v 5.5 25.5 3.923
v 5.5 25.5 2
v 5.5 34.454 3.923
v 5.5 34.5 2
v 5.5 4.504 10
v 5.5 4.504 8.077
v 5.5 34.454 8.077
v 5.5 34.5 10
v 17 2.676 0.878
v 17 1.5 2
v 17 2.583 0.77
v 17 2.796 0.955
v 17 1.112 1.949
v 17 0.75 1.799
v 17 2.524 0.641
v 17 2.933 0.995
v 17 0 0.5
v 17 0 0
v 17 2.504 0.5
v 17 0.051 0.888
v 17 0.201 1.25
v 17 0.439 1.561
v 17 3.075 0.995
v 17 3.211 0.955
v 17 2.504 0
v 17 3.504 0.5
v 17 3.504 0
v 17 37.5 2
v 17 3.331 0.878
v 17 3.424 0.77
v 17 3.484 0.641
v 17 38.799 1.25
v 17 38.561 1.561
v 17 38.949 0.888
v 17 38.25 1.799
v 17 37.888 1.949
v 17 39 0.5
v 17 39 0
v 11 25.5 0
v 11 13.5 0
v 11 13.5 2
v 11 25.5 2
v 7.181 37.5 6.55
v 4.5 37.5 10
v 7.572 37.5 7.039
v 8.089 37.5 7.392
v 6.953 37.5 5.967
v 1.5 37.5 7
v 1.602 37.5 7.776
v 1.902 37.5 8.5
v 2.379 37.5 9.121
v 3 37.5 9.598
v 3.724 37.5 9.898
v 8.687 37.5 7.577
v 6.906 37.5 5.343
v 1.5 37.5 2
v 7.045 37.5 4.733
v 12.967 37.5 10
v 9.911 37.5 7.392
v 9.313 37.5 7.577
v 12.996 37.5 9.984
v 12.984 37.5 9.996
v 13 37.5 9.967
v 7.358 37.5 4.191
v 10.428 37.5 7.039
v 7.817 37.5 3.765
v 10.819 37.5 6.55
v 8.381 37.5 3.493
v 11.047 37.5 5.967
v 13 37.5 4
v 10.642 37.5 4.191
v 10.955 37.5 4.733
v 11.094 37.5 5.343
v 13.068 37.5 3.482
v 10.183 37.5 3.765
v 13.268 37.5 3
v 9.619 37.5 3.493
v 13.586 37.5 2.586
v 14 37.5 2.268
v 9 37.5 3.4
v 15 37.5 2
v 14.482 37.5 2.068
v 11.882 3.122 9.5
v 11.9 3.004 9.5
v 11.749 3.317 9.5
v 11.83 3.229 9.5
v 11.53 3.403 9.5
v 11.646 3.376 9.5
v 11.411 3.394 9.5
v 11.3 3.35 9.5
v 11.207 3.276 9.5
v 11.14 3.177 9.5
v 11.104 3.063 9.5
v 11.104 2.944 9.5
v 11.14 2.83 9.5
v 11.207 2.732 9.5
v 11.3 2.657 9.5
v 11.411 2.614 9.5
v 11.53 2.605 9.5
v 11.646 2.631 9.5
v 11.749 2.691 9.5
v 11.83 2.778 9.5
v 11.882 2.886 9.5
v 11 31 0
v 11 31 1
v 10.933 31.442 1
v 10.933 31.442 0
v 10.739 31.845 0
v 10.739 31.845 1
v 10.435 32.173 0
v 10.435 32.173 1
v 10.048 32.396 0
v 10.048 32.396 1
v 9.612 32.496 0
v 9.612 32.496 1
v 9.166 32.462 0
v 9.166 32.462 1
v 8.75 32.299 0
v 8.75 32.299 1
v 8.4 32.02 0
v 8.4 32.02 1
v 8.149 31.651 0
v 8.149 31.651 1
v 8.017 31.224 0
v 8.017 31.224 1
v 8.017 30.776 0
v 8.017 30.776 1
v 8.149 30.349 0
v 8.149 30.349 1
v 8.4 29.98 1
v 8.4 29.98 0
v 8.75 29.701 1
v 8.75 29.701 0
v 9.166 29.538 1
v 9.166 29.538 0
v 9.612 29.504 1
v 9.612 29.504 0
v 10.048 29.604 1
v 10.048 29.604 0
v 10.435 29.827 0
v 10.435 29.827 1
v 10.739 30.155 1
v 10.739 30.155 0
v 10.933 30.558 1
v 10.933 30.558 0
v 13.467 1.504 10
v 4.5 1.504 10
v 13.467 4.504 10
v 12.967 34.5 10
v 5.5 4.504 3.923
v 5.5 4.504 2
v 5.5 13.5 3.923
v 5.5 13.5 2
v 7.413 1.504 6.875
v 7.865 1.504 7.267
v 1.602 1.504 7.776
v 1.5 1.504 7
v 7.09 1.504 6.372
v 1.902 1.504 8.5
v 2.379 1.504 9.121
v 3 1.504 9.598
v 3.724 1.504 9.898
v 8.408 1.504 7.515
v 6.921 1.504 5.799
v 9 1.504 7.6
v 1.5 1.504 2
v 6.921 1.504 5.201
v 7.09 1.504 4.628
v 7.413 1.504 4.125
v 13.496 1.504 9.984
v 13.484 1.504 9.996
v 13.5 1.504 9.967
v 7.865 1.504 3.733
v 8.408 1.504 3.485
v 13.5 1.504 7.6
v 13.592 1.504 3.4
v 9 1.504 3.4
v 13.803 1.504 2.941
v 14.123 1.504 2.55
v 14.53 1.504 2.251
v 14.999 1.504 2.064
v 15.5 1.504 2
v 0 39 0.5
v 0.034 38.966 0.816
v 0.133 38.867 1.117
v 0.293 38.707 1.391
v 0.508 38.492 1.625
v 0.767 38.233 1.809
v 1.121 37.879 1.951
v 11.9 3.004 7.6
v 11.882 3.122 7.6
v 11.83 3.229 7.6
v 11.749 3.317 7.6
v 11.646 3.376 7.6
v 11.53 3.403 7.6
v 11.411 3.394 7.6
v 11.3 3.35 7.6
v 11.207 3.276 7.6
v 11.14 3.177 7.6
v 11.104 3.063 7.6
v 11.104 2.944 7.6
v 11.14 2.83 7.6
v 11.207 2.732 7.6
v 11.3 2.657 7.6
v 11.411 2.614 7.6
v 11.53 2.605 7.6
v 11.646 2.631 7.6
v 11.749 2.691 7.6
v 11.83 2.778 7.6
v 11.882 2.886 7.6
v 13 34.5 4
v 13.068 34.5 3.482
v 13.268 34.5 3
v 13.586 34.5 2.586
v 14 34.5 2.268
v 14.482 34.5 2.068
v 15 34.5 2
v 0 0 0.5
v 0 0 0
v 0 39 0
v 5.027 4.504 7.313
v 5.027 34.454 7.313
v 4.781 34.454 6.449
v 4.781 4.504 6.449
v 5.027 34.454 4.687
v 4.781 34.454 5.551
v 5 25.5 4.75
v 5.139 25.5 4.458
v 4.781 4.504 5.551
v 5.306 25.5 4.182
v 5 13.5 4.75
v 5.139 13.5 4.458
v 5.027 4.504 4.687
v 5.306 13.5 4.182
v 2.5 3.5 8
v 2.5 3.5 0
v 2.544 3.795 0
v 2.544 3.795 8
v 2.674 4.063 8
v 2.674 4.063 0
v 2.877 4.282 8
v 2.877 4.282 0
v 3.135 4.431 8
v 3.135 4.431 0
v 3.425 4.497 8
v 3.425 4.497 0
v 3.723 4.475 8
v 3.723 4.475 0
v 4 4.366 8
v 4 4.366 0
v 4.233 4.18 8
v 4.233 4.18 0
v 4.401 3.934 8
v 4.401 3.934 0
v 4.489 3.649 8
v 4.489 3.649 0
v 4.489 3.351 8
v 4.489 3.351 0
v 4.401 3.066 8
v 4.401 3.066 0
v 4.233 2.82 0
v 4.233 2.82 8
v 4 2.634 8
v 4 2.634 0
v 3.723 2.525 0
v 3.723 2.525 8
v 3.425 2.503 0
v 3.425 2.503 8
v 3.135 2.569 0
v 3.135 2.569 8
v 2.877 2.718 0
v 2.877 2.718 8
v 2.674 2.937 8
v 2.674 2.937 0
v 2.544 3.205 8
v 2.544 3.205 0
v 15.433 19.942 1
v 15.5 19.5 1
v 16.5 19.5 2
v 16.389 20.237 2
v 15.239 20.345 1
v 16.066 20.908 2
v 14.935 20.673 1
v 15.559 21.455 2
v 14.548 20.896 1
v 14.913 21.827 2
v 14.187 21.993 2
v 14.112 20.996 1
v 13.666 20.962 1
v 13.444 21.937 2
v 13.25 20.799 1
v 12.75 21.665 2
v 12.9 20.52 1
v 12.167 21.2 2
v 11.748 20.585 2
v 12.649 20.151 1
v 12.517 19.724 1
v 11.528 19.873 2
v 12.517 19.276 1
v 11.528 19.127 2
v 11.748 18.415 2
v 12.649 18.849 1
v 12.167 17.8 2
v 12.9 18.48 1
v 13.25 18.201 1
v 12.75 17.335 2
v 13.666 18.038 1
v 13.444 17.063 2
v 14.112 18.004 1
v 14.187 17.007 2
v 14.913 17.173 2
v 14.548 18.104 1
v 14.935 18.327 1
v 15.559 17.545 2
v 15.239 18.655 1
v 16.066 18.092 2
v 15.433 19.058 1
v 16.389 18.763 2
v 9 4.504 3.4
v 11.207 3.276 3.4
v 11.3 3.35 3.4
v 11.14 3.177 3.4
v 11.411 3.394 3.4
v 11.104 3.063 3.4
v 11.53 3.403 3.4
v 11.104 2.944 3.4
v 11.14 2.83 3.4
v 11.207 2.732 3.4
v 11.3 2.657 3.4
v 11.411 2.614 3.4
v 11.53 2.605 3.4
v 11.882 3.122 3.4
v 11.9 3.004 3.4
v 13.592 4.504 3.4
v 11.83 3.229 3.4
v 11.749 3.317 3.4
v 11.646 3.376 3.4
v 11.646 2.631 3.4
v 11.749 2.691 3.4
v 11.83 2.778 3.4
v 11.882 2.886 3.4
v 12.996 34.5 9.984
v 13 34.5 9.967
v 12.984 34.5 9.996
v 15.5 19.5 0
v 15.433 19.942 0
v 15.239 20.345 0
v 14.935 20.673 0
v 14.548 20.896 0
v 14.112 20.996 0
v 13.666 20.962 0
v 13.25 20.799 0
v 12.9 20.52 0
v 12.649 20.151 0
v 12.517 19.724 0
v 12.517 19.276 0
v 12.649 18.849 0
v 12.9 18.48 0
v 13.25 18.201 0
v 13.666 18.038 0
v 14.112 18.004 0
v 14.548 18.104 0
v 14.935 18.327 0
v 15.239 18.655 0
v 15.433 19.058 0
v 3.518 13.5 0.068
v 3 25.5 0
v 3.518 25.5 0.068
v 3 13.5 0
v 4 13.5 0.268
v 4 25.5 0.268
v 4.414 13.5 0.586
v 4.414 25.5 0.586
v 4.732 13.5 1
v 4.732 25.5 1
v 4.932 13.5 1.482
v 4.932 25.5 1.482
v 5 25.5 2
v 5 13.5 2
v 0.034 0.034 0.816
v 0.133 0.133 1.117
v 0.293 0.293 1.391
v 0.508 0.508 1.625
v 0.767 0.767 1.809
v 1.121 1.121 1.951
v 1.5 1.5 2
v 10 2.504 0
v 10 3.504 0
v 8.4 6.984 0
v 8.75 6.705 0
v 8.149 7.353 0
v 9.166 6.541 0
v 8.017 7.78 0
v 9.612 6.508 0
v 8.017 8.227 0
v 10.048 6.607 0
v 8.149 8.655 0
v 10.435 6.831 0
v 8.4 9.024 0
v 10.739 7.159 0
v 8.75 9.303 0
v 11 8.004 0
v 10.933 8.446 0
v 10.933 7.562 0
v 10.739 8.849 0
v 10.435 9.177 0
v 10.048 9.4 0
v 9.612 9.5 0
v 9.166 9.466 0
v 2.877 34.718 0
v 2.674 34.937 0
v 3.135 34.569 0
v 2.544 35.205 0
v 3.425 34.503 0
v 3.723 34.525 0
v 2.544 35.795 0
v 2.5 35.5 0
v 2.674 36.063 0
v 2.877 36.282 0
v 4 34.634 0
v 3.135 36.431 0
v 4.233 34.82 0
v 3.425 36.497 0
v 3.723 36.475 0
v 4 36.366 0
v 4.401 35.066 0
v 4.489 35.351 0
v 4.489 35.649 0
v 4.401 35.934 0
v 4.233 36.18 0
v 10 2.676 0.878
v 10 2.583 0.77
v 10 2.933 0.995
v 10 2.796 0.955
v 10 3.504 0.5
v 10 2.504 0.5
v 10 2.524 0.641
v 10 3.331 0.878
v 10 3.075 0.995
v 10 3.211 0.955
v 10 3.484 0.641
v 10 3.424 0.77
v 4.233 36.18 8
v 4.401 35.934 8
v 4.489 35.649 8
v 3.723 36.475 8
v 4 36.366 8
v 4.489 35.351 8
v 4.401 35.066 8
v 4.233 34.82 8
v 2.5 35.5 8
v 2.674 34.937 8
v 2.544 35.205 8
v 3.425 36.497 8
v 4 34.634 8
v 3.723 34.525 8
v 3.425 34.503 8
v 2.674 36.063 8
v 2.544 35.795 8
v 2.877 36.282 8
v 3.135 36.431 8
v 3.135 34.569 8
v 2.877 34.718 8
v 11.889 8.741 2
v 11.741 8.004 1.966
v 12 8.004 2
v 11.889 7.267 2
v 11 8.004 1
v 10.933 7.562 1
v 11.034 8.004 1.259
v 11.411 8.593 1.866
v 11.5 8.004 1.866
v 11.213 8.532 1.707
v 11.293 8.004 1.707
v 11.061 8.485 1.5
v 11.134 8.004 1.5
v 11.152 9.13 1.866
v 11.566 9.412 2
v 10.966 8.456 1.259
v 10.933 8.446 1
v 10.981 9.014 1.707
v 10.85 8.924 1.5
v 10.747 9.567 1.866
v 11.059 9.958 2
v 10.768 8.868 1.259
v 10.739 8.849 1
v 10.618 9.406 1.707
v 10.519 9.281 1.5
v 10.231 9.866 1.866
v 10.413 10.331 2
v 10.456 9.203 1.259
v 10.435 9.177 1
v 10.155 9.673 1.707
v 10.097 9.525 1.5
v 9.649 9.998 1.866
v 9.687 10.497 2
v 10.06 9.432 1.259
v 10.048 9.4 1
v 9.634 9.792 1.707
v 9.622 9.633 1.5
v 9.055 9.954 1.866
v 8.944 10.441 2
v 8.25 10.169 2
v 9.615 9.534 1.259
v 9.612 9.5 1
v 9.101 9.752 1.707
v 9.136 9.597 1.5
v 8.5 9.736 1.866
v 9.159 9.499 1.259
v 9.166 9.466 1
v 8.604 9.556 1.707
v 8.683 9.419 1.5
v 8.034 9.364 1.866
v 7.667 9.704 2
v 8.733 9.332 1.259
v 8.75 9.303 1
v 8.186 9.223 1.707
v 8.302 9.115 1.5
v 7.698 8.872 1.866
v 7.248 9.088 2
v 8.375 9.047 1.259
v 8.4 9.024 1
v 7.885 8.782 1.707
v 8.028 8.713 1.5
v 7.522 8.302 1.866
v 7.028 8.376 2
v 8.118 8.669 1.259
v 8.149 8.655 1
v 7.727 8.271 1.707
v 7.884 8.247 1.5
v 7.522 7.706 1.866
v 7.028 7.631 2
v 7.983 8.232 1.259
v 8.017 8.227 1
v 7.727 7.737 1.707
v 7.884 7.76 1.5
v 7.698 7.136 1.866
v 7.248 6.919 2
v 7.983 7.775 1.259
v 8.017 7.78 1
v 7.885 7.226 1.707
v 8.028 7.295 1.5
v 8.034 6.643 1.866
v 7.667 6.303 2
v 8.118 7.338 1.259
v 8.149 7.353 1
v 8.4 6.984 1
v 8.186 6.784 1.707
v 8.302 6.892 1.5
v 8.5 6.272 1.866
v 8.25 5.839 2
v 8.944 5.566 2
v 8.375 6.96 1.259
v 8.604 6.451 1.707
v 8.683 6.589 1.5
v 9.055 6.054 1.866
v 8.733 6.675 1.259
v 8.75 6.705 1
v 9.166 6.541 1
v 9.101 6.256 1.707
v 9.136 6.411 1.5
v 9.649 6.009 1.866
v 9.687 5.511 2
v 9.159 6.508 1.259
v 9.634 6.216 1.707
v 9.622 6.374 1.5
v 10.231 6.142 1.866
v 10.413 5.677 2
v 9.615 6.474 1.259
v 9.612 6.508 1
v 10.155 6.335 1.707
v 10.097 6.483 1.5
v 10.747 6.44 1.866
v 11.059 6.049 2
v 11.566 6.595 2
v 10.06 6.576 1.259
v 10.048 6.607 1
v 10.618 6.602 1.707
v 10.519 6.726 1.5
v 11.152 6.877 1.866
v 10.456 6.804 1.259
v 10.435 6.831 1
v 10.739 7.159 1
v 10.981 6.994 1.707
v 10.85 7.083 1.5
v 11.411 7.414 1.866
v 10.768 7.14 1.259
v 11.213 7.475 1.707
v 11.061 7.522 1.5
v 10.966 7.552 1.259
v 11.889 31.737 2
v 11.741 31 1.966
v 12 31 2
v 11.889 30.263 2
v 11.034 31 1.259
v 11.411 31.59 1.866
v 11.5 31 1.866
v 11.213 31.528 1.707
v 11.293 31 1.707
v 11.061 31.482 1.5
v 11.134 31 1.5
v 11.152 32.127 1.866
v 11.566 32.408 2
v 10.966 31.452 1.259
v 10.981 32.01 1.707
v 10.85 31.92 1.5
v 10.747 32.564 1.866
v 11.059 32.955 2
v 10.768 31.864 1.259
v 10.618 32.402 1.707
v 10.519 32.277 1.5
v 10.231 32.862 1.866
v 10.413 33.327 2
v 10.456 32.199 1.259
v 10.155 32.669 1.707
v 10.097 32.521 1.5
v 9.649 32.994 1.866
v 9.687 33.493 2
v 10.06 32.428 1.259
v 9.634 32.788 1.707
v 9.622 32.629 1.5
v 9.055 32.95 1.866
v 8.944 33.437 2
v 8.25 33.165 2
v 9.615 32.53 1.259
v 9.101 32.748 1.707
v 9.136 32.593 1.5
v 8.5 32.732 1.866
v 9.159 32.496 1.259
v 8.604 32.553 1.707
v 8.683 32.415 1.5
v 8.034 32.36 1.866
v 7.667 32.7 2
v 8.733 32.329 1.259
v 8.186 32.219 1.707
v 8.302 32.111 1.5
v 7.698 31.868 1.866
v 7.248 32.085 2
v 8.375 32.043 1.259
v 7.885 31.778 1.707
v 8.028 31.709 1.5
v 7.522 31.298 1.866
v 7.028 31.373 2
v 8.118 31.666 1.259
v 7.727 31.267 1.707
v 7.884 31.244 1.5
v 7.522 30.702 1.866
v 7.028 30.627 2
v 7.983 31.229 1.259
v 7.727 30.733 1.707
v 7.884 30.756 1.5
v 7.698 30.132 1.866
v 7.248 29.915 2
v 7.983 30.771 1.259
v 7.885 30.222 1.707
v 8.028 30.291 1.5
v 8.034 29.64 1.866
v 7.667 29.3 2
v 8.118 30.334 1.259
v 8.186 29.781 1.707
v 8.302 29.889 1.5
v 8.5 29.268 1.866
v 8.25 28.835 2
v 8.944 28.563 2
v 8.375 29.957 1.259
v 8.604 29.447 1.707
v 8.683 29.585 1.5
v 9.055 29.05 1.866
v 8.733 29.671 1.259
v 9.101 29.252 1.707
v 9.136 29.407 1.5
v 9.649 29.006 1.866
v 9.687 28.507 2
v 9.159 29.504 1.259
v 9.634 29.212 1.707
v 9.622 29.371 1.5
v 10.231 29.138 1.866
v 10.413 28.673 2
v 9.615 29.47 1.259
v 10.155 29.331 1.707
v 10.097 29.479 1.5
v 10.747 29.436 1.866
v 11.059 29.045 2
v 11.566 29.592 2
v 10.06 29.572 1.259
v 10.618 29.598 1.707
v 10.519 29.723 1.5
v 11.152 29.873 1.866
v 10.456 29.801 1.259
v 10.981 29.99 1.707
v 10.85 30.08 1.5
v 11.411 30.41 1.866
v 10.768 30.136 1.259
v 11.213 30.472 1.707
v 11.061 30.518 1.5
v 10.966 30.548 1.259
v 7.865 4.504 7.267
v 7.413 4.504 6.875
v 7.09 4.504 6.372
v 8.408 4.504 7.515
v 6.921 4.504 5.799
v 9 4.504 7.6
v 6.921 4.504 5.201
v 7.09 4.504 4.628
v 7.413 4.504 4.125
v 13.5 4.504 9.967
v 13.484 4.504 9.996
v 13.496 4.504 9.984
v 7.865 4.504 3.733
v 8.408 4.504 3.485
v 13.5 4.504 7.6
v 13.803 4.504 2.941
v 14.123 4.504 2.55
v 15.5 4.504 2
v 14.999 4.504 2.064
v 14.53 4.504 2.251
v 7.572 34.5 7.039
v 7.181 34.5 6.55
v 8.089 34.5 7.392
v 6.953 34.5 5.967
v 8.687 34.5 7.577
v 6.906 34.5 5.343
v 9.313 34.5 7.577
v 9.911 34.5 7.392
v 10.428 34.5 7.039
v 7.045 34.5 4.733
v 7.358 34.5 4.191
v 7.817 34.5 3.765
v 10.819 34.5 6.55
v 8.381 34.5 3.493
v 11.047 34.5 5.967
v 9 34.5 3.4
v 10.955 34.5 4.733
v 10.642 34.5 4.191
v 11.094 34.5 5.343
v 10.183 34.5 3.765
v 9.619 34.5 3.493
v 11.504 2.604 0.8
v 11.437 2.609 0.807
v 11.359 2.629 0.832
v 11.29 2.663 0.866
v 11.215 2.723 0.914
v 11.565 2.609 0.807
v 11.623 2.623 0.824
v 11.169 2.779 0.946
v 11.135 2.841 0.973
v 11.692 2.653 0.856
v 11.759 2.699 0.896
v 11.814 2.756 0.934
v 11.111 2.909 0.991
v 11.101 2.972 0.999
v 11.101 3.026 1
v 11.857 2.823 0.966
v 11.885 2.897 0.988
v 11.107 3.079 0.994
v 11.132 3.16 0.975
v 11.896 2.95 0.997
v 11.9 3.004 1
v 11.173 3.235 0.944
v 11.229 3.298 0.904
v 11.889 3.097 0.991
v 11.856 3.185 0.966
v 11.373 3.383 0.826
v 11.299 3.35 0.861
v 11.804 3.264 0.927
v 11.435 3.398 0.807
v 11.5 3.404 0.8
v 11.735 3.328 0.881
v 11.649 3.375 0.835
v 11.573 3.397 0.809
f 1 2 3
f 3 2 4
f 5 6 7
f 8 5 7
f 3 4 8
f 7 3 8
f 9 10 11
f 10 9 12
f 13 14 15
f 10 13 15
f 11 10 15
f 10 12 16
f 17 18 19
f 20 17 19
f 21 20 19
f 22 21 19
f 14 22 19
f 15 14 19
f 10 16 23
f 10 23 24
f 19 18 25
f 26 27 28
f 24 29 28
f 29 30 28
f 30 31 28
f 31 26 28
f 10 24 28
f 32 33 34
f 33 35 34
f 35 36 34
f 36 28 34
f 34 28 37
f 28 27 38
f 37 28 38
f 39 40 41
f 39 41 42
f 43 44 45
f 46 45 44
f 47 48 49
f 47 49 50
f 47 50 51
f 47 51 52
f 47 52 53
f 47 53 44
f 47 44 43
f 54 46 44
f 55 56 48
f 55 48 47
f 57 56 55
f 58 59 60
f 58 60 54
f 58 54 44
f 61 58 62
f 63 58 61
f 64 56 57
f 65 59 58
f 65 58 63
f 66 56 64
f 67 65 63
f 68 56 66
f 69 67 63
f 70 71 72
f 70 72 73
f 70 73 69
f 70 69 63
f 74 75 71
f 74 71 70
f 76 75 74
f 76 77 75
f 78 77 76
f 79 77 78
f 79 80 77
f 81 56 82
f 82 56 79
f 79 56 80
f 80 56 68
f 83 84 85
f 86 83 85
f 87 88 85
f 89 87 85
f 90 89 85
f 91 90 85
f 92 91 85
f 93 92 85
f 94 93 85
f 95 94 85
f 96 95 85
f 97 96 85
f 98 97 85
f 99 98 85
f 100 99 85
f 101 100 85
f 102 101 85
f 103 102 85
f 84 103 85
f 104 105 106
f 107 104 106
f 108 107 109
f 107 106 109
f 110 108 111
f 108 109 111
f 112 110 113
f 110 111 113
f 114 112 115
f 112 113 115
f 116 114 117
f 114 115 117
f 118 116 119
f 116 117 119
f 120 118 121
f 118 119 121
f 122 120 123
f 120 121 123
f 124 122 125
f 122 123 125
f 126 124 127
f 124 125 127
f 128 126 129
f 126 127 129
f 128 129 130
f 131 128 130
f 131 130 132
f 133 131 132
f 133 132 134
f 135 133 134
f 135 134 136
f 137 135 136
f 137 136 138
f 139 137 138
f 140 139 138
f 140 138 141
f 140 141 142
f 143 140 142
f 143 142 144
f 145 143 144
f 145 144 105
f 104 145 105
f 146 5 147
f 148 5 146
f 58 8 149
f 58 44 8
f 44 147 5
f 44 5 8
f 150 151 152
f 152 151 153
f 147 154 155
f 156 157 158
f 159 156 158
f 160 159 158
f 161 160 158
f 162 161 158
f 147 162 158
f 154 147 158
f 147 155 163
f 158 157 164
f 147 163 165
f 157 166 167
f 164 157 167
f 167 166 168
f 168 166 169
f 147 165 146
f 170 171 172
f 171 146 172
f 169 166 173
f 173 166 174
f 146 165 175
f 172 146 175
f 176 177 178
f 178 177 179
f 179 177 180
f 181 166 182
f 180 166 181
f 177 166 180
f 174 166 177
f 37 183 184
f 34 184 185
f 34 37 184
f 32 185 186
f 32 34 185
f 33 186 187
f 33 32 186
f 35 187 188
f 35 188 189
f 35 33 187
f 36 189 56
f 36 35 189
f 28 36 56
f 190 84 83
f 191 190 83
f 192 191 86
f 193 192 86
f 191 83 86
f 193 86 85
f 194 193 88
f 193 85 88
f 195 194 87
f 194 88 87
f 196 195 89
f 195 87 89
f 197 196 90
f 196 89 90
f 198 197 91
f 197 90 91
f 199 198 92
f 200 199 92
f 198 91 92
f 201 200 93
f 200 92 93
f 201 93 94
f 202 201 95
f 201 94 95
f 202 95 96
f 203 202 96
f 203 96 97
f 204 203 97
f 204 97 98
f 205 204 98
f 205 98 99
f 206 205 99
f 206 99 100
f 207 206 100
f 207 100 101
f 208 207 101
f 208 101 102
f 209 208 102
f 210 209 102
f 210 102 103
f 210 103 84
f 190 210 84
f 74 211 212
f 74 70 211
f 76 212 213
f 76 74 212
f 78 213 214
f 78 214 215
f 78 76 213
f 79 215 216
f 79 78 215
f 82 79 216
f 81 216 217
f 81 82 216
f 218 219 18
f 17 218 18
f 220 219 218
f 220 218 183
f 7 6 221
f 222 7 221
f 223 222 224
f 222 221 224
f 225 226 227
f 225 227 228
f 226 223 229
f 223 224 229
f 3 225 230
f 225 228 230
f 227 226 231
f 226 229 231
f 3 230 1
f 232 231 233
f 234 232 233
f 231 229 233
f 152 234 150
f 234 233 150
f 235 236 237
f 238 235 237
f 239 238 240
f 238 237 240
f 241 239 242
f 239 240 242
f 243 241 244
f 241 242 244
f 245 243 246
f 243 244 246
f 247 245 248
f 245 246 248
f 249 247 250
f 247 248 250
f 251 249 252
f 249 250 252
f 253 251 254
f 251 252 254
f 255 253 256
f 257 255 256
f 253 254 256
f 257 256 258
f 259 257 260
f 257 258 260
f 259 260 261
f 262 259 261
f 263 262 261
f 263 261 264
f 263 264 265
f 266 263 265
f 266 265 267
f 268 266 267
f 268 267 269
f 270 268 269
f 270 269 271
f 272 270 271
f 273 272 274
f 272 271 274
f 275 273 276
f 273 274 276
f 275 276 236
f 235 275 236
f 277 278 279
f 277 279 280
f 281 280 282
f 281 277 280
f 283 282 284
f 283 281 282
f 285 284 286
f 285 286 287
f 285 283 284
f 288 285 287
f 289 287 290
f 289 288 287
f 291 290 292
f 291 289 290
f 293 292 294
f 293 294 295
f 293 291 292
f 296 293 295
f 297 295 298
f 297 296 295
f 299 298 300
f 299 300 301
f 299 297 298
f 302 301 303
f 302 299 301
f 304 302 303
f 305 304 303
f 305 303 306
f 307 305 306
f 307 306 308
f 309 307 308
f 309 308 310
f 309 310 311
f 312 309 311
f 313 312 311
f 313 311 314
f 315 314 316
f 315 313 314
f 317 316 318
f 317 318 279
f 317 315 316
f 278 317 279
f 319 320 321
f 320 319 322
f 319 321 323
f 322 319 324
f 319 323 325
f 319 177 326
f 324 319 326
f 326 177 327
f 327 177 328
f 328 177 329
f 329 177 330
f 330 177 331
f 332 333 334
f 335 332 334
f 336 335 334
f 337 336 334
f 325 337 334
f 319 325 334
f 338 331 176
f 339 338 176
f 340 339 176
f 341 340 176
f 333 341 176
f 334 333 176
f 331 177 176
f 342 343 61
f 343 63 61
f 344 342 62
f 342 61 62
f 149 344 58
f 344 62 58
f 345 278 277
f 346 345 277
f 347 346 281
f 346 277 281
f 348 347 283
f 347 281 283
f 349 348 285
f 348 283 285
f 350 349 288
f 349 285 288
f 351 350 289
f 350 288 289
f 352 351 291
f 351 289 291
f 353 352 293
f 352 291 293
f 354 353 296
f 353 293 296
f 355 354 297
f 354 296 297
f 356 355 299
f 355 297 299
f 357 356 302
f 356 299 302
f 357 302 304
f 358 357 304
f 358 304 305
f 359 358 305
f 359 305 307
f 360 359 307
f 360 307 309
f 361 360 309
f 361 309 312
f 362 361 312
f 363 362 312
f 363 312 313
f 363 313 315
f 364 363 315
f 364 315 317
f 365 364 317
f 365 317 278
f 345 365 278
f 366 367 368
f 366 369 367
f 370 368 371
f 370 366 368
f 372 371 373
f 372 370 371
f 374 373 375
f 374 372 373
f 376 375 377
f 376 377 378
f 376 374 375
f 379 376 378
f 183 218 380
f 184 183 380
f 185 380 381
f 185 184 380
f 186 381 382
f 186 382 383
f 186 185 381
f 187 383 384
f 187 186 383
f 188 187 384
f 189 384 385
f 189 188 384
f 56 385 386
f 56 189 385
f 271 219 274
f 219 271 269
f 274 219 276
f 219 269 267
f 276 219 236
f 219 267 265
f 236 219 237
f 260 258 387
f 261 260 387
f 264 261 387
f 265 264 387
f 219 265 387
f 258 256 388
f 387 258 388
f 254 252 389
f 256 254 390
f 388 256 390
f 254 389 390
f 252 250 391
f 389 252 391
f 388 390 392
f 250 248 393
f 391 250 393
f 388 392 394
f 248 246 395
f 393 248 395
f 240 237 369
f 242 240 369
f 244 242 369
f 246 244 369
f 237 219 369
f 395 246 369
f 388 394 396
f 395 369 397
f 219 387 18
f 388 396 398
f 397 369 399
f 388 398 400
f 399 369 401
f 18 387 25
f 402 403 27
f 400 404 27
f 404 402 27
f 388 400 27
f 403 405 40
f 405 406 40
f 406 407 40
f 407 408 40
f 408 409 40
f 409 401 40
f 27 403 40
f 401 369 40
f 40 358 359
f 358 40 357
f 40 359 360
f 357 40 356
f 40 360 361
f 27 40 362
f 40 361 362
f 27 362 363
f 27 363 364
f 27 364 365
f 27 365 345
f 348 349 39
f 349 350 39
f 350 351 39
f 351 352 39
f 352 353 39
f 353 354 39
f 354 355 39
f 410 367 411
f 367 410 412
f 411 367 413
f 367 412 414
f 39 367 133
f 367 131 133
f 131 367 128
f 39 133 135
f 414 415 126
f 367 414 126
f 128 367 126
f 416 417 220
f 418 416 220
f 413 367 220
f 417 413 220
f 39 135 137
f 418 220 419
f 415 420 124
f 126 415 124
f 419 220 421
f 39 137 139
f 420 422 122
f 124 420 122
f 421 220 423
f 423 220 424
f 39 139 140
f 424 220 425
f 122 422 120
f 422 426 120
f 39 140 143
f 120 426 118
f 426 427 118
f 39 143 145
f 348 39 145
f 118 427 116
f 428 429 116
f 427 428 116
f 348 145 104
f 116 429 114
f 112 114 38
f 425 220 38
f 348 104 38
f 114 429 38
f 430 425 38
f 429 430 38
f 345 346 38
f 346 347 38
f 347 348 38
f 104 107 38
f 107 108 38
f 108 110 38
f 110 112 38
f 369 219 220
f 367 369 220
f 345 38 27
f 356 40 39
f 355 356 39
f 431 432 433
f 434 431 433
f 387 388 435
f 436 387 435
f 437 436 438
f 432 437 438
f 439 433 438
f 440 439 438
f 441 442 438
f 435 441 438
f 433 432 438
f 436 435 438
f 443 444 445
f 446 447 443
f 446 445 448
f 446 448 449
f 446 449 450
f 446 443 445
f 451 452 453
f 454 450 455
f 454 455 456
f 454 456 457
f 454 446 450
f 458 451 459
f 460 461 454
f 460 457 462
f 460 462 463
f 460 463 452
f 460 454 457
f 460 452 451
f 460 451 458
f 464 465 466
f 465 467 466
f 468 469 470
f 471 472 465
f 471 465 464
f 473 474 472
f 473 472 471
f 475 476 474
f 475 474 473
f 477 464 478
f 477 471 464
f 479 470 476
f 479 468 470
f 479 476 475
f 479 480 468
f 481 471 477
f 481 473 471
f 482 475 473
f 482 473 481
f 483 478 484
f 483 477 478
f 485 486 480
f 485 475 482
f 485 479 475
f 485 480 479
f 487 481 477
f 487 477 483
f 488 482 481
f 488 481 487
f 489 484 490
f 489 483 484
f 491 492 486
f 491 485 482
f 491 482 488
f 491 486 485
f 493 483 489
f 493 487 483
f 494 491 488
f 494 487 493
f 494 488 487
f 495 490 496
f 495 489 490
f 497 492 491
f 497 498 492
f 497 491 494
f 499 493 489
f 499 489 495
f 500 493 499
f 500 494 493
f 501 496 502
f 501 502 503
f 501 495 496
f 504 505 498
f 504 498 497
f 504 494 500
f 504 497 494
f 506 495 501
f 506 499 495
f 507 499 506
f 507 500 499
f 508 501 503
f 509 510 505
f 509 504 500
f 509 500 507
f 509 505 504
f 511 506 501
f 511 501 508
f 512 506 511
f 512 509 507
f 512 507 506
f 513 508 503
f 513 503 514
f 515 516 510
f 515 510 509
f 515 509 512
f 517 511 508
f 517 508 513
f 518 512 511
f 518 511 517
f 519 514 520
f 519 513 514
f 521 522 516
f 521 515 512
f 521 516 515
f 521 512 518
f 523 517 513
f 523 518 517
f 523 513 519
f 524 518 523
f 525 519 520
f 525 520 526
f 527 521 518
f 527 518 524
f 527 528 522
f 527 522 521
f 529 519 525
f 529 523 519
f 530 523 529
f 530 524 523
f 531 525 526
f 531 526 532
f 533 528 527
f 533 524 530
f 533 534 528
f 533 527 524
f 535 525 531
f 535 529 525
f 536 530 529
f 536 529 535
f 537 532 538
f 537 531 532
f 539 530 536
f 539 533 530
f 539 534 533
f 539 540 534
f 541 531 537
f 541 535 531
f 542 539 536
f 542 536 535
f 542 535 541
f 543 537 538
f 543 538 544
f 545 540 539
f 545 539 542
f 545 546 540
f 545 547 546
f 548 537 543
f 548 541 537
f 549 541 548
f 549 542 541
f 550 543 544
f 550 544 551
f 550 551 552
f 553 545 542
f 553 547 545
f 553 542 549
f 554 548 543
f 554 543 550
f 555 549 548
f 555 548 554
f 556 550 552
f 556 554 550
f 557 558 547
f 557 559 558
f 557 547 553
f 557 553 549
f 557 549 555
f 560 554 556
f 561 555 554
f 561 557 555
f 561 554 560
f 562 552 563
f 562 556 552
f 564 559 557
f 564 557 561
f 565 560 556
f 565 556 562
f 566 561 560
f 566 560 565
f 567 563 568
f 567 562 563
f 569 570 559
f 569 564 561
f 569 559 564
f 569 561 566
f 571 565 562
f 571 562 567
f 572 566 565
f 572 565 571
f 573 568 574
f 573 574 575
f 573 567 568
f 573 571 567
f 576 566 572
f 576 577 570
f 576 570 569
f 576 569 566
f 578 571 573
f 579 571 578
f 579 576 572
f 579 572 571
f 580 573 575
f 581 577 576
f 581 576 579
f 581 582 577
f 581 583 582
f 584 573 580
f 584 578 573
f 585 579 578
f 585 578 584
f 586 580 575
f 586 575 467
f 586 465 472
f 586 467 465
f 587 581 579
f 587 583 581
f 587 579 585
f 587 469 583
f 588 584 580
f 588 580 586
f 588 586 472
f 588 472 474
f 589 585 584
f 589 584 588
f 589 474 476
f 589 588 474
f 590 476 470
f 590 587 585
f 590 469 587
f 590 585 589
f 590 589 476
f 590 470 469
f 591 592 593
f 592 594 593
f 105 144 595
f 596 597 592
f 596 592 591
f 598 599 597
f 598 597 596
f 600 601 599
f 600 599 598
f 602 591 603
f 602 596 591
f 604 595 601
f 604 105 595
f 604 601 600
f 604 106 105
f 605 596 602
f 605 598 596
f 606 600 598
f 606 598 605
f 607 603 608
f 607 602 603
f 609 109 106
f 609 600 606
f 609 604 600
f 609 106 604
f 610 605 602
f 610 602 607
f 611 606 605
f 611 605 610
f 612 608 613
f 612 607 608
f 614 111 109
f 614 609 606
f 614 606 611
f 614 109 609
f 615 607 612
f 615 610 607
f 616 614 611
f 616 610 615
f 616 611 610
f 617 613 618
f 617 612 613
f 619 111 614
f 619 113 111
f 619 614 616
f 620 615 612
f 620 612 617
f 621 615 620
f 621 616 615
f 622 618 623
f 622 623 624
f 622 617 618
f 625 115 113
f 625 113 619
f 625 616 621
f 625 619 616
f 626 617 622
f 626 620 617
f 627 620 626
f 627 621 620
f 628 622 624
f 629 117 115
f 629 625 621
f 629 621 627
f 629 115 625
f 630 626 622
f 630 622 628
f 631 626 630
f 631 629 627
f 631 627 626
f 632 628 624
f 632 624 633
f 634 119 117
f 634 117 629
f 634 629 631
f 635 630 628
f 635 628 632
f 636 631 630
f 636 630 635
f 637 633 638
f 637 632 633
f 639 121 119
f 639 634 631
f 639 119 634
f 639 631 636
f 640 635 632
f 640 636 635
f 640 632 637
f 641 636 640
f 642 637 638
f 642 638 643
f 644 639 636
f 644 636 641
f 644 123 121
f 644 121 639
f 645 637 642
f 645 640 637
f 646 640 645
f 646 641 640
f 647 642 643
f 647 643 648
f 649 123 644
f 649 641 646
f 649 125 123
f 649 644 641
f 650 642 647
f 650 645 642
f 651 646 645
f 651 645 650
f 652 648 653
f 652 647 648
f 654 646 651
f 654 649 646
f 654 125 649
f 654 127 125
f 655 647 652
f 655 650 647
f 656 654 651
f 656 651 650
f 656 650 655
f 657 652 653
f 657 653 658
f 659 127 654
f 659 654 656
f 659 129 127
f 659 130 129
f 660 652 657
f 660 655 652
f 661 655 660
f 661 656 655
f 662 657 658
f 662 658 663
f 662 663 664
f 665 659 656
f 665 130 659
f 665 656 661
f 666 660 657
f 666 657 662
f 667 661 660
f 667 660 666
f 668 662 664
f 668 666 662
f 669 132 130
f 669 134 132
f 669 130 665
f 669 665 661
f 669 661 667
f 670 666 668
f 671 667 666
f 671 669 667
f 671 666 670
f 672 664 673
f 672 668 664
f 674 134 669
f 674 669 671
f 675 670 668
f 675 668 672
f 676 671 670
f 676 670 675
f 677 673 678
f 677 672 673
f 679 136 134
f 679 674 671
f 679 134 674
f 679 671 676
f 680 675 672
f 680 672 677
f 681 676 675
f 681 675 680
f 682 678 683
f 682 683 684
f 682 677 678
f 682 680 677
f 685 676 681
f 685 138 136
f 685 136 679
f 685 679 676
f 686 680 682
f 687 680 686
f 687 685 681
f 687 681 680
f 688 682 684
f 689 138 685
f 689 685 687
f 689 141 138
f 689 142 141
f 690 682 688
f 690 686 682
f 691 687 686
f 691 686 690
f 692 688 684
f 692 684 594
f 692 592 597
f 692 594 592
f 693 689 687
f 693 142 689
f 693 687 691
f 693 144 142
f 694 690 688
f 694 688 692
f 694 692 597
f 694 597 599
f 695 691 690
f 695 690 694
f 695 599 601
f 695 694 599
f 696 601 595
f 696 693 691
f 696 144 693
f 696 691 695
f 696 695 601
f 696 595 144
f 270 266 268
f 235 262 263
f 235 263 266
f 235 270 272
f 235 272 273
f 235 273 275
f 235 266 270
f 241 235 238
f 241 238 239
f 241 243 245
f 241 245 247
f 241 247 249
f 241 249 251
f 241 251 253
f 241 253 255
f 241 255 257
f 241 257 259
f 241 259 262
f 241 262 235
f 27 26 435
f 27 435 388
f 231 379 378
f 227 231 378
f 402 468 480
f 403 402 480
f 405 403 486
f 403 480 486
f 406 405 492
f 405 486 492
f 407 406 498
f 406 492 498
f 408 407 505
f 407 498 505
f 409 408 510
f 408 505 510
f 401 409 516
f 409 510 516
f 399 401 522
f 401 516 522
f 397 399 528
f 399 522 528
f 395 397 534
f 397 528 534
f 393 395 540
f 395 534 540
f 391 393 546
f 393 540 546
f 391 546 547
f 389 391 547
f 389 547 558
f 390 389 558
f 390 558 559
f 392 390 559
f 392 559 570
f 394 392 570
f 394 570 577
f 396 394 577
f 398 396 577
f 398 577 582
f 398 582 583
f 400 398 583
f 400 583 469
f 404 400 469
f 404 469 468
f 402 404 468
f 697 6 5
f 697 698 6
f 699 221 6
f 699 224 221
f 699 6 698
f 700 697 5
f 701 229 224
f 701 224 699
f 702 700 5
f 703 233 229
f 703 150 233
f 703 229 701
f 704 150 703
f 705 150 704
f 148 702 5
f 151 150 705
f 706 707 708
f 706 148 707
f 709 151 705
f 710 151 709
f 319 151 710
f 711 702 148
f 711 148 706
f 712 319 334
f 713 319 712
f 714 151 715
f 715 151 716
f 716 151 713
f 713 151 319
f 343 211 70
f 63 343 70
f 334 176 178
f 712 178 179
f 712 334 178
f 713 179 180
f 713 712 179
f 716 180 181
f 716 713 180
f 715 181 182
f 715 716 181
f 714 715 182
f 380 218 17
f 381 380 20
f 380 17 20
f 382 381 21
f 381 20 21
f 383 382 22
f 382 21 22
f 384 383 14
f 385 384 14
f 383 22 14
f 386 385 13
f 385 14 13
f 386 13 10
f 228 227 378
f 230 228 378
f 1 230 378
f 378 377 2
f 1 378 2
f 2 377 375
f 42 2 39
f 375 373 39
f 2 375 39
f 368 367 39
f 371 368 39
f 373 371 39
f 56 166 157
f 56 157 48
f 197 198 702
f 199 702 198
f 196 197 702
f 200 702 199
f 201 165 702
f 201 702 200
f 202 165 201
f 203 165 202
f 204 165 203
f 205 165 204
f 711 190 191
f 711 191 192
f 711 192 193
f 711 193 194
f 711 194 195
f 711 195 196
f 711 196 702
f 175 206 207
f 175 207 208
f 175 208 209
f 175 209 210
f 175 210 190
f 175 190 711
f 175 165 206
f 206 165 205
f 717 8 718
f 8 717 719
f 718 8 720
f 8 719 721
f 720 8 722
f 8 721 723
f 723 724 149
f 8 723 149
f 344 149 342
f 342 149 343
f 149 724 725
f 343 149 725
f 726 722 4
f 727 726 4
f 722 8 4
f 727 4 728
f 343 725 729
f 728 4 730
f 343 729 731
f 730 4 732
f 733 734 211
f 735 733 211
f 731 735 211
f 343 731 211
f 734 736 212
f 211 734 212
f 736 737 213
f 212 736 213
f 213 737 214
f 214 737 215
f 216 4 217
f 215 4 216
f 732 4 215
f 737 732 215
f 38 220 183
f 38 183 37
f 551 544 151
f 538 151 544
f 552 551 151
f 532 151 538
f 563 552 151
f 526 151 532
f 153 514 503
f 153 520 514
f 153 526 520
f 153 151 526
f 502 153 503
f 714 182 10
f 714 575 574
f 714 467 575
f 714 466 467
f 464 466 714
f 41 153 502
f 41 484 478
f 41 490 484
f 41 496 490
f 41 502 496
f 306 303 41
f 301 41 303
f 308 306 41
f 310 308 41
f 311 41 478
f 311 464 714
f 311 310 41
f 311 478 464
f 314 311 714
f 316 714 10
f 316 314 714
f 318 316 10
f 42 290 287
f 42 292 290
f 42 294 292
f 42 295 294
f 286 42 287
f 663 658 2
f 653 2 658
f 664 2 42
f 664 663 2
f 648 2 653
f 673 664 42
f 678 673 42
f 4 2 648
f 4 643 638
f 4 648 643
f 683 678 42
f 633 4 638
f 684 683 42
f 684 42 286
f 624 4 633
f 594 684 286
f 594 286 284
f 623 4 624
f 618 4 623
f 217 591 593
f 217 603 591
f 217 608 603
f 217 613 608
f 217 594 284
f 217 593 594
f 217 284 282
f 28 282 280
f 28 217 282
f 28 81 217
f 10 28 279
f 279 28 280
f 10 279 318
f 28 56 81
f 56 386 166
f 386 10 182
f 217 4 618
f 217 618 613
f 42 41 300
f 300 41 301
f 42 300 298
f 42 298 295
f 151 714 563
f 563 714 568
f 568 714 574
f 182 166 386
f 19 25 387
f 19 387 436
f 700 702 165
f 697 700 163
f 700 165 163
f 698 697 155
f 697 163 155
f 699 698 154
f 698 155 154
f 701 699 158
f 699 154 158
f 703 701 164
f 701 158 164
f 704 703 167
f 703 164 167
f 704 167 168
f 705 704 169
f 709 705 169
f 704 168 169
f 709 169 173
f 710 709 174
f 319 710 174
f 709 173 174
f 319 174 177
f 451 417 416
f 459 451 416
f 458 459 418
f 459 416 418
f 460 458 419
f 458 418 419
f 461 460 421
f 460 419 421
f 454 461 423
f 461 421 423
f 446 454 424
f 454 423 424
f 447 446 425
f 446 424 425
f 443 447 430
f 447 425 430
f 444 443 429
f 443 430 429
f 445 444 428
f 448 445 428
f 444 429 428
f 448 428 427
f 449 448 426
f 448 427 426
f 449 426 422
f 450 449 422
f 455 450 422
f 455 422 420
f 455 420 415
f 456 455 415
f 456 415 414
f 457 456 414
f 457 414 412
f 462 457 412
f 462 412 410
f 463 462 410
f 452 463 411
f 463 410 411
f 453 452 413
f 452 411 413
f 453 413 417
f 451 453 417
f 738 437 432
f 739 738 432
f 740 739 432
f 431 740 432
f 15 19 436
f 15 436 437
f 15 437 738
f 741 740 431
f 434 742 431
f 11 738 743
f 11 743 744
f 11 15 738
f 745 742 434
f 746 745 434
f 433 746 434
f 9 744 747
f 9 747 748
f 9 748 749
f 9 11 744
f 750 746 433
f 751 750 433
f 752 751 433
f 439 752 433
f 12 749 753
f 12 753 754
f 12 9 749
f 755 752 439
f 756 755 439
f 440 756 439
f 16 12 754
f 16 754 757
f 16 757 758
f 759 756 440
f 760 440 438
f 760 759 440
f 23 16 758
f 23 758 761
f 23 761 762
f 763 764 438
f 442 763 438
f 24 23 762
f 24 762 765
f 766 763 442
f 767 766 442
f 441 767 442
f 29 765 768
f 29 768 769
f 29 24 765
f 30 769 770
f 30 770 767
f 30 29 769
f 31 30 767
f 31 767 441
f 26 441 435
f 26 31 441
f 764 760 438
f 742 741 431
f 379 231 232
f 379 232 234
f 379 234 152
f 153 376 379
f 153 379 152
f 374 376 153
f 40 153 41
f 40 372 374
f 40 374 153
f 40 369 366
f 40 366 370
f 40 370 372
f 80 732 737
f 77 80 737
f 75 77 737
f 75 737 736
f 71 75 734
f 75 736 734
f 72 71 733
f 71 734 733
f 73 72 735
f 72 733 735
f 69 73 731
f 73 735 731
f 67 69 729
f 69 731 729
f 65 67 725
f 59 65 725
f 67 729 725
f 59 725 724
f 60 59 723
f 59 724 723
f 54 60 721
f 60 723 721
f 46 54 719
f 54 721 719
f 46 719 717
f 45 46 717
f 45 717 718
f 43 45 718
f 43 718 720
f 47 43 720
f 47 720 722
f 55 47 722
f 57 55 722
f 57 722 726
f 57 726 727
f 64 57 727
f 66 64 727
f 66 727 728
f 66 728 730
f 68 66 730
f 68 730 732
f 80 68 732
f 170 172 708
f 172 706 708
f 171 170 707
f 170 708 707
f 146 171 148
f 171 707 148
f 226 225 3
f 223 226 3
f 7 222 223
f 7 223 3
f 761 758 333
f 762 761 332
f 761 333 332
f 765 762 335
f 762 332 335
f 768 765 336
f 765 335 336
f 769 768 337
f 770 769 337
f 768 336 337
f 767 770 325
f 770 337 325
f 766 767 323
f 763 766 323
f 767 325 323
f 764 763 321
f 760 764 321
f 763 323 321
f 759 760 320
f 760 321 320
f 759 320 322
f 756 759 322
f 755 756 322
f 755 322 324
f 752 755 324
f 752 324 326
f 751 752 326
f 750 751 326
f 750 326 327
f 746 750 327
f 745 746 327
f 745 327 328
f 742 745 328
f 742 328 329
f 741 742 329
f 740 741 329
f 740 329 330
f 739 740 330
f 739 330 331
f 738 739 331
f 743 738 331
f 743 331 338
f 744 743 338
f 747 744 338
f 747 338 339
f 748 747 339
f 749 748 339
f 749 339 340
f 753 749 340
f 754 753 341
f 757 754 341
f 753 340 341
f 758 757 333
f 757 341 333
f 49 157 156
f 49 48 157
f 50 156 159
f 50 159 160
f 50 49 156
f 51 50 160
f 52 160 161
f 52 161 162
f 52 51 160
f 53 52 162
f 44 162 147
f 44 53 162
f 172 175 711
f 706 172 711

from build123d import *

# Parameters (mm, degrees)
ESQUISSE1_W                  = 17
ESQUISSE1_H                  = 39
BOSS_EXTRU_1_DEPTH           = 2
ESQUISSE2_W                  = 8
ESQUISSE2_H                  = 3
ESQUISSE2_W_2                = 9
BOSS_EXTRU_2_DEPTH           = 8
ESQUISSE3_R                  = 2.1
ENL_V_MAT_EXTRU_1_DEPTH      = 43.367037979
CONG_1_R                     = 0.0326
ESQUISSE14_W                 = 4
ESQUISSE14_H                 = 35.996211904
BOSS_EXTRU_8_DEPTH           = 8
ENL_V_MAT_EXTRU_2_DEPTH      = 3
ENL_V_MAT_EXTRU_2_DEPTH_BACK = 44.289721644
ESQUISSE4_W                  = 6
ESQUISSE4_H                  = 12
ENL_V_START                  = -3
ESQUISSE15_R                 = 3.25
ENL_V_MAT_EXTRU_7_DEPTH      = 29.95
CONG_9_R                     = 3
CONG_10_R                    = 2
CONG_11_R                    = 2
CONG_12_R                    = 1.5
ESQUISSE16_R                 = 1
ENL_V_MAT_EXTRU_8_DEPTH      = 8
ENL_V_MAT_EXTRU_9_REACH      = 44.367
ESQUISSE17_W                 = 6.298788147
ESQUISSE17_H                 = 4.2
ENL_V_START_2                = -0.5
ESQUISSE18_R                 = 0.4
ENL_V_MAT_EXTRU_10_DEPTH     = 10
ENL_V_MAT_EXTRU_18_DEPTH     = 7
ESQUISSE21_R                 = 1.5
ENL_V_MAT_EXTRU_19_DEPTH     = 44.289721683
CHANFREIN1_SIZE              = 1
ENL_V_MAT_EXTRU_20_REACH     = 45.29
ESQUISSE22_R                 = 1.5
CONG_14_R                    = 1


with BuildPart() as part:
    # Esquisse1 → Boss.-Extru.1 (new body)
    with BuildSketch(Plane.XY):
        with Locations((8.5, 19.5)):
            Rectangle(ESQUISSE1_W, ESQUISSE1_H)
    extrude(amount=BOSS_EXTRU_1_DEPTH)

    # Esquisse2 → Boss.-Extru.2 (add)
    with BuildSketch(Plane.XY.offset(2)):
        with Locations((9, 36)):
            Rectangle(ESQUISSE2_W, ESQUISSE2_H)
        with Locations((9, 3.003788096)):
            Rectangle(ESQUISSE2_W_2, ESQUISSE2_H)
    extrude(amount=BOSS_EXTRU_2_DEPTH)

    # Esquisse3 → Enlèv. mat.-Extru.1 (cut, through all)
    with BuildSketch(Plane.XZ.offset(-1.503788096)):
        with Locations(Location((9, 5.5, 0), (0, 0, 270))):
            Circle(ESQUISSE3_R)
    extrude(amount=-ENL_V_MAT_EXTRU_1_DEPTH, mode=Mode.SUBTRACT)

    # Congé1
    cong_1_edges = [part.edges().sort_by_distance(p)[0] for p in [
        (13, 36, 10),
        (13.5, 3.003788096, 10),
    ]]
    fillet(cong_1_edges, radius=CONG_1_R)

    # Esquisse14 → Boss.-Extru.8 (add)
    with BuildSketch(Plane.XY.offset(2)):
        with Locations((3.5, 19.501894048)):
            Rectangle(ESQUISSE14_W, ESQUISSE14_H)
    extrude(amount=BOSS_EXTRU_8_DEPTH)

    # Esquisse4 → Enlèv. mat.-Extru.2 (cut, two sides: drawn at the far end of the back side and taken through both)
    with BuildSketch(Plane.XY.offset(2).offset(-ENL_V_MAT_EXTRU_2_DEPTH_BACK)):
        with Locations((8, 19.5)):
            Rectangle(ESQUISSE4_W, ESQUISSE4_H)
    extrude(amount=ENL_V_MAT_EXTRU_2_DEPTH + ENL_V_MAT_EXTRU_2_DEPTH_BACK, mode=Mode.SUBTRACT)

    # Esquisse15 → Enlèv. mat.-Extru.7 (cut)
    with BuildSketch(Plane.XZ.offset(-1.503788096).offset(ENL_V_START)):
        with Locations((8, 6)):
            Circle(ESQUISSE15_R)
    extrude(amount=-ENL_V_MAT_EXTRU_7_DEPTH, mode=Mode.SUBTRACT)

    # Congé9
    cong_9_edges = [part.edges().sort_by_distance(p)[0] for p in [
        (1.5, 19.501894048, 10),
    ]]
    fillet(cong_9_edges, radius=CONG_9_R)

    # Congé10
    cong_10_edges = [part.edges().sort_by_distance(p)[0] for p in [
        (5, 19.5, 0),
    ]]
    fillet(cong_10_edges, radius=CONG_10_R)

    # Congé11
    cong_11_edges = [part.edges().sort_by_distance(p)[0] for p in [
        (13, 36, 2),
        (13.5, 3.003788096, 2),
    ]]
    fillet(cong_11_edges, radius=CONG_11_R)

    # Congé12
    cong_12_edges = [part.edges().sort_by_distance(p)[0] for p in [
        (8.5, 39, 2),
        (0, 19.5, 2),
        (8.5, 0, 2),
    ]]
    fillet(cong_12_edges, radius=CONG_12_R - 0.0001)  # a hair under: the kernel refuses the full size

    # Esquisse16 → Enlèv. mat.-Extru.8 (cut)
    with BuildSketch(Plane(origin=(0, 0, 0), x_dir=(-1, 0, 0), z_dir=(0, 0, -1))):
        with Locations((-3.5, 35.5)):
            Circle(ESQUISSE16_R)
        with Locations((-3.5, 3.5)):
            Circle(ESQUISSE16_R)
    extrude(amount=-ENL_V_MAT_EXTRU_8_DEPTH, mode=Mode.SUBTRACT)

    # Esquisse17 → Enlèv. mat.-Extru.9 (cut, up to next)
    with BuildSketch(Plane.XZ.offset(-1.503788096), mode=Mode.PRIVATE) as enl_v_mat_extru_9_sk1:
        with Locations((12.149394074, 5.5)):
            Rectangle(ESQUISSE17_W, ESQUISSE17_H)
    enl_v_mat_extru_9_tool1 = extrude(enl_v_mat_extru_9_sk1.sketch, amount=-ENL_V_MAT_EXTRU_9_REACH, mode=Mode.PRIVATE) & part.part
    add(enl_v_mat_extru_9_tool1.solids().sort_by_distance((12.149394, 1.503788, 5.5))[0], mode=Mode.SUBTRACT)

    # Esquisse18 → Enlèv. mat.-Extru.10 (cut)
    with BuildSketch(Plane.XY.offset(10).offset(ENL_V_START_2)):
        with Locations((11.5, 3.003788096)):
            Circle(ESQUISSE18_R)
    extrude(amount=-ENL_V_MAT_EXTRU_10_DEPTH, mode=Mode.SUBTRACT)

    # Esquisse20 → Enlèv. mat.-Extru.18 (cut)
    with BuildSketch(Plane(origin=(17, 0, 0), x_dir=(0, 0, -1), z_dir=(1, 0, 0))):
        with BuildLine():
            Line((-0.5, 3.503788096), (1.040895872, 3.503788096))
            ThreePointArc((1.040895872, 3.503788096), (1.540895872, 3.003788096), (1.040895872, 2.503788096))
            Line((1.040895872, 2.503788096), (-0.5, 2.503788096))
            ThreePointArc((-0.5, 2.503788096), (-1, 3.003788096), (-0.5, 3.503788096))
        make_face()
    extrude(amount=-ENL_V_MAT_EXTRU_18_DEPTH, mode=Mode.SUBTRACT)

    # Esquisse21 → Enlèv. mat.-Extru.19 (cut, through all)
    with BuildSketch(Plane.XY.offset(2)):
        with Locations((14, 19.5)):
            Circle(ESQUISSE21_R)
    extrude(amount=-ENL_V_MAT_EXTRU_19_DEPTH, mode=Mode.SUBTRACT)

    # Chanfrein1
    chanfrein1_edges = [part.edges().sort_by_distance(p)[0] for p in [
        (12.5, 19.5, 2),
    ]]
    chamfer(chanfrein1_edges, length=CHANFREIN1_SIZE)

    # Esquisse22 → Enlèv. mat.-Extru.20 (cut, up to next)
    with BuildSketch(Plane.XY.offset(2), mode=Mode.PRIVATE) as enl_v_mat_extru_20_sk1:
        with Locations((9.5, 31)):
            Circle(ESQUISSE22_R)
    enl_v_mat_extru_20_tool1 = extrude(enl_v_mat_extru_20_sk1.sketch, amount=-ENL_V_MAT_EXTRU_20_REACH, mode=Mode.PRIVATE) & part.part
    # Esquisse22 → Enlèv. mat.-Extru.20 (cut, up to next)
    with BuildSketch(Plane.XY.offset(2), mode=Mode.PRIVATE) as enl_v_mat_extru_20_sk2:
        with Locations((9.5, 8.003788096)):
            Circle(ESQUISSE22_R)
    enl_v_mat_extru_20_tool2 = extrude(enl_v_mat_extru_20_sk2.sketch, amount=-ENL_V_MAT_EXTRU_20_REACH, mode=Mode.PRIVATE) & part.part
    add(enl_v_mat_extru_20_tool1.solids().sort_by_distance((9.5, 31, 2))[0], mode=Mode.SUBTRACT)
    add(enl_v_mat_extru_20_tool2.solids().sort_by_distance((9.5, 8.003788, 2))[0], mode=Mode.SUBTRACT)

    # Congé14
    cong_14_edges = [part.edges().sort_by_distance(p)[0] for p in [
        (8, 31, 2),
        (8, 8.003788096, 2),
    ]]
    fillet(cong_14_edges, radius=CONG_14_R)


solid = part.part
